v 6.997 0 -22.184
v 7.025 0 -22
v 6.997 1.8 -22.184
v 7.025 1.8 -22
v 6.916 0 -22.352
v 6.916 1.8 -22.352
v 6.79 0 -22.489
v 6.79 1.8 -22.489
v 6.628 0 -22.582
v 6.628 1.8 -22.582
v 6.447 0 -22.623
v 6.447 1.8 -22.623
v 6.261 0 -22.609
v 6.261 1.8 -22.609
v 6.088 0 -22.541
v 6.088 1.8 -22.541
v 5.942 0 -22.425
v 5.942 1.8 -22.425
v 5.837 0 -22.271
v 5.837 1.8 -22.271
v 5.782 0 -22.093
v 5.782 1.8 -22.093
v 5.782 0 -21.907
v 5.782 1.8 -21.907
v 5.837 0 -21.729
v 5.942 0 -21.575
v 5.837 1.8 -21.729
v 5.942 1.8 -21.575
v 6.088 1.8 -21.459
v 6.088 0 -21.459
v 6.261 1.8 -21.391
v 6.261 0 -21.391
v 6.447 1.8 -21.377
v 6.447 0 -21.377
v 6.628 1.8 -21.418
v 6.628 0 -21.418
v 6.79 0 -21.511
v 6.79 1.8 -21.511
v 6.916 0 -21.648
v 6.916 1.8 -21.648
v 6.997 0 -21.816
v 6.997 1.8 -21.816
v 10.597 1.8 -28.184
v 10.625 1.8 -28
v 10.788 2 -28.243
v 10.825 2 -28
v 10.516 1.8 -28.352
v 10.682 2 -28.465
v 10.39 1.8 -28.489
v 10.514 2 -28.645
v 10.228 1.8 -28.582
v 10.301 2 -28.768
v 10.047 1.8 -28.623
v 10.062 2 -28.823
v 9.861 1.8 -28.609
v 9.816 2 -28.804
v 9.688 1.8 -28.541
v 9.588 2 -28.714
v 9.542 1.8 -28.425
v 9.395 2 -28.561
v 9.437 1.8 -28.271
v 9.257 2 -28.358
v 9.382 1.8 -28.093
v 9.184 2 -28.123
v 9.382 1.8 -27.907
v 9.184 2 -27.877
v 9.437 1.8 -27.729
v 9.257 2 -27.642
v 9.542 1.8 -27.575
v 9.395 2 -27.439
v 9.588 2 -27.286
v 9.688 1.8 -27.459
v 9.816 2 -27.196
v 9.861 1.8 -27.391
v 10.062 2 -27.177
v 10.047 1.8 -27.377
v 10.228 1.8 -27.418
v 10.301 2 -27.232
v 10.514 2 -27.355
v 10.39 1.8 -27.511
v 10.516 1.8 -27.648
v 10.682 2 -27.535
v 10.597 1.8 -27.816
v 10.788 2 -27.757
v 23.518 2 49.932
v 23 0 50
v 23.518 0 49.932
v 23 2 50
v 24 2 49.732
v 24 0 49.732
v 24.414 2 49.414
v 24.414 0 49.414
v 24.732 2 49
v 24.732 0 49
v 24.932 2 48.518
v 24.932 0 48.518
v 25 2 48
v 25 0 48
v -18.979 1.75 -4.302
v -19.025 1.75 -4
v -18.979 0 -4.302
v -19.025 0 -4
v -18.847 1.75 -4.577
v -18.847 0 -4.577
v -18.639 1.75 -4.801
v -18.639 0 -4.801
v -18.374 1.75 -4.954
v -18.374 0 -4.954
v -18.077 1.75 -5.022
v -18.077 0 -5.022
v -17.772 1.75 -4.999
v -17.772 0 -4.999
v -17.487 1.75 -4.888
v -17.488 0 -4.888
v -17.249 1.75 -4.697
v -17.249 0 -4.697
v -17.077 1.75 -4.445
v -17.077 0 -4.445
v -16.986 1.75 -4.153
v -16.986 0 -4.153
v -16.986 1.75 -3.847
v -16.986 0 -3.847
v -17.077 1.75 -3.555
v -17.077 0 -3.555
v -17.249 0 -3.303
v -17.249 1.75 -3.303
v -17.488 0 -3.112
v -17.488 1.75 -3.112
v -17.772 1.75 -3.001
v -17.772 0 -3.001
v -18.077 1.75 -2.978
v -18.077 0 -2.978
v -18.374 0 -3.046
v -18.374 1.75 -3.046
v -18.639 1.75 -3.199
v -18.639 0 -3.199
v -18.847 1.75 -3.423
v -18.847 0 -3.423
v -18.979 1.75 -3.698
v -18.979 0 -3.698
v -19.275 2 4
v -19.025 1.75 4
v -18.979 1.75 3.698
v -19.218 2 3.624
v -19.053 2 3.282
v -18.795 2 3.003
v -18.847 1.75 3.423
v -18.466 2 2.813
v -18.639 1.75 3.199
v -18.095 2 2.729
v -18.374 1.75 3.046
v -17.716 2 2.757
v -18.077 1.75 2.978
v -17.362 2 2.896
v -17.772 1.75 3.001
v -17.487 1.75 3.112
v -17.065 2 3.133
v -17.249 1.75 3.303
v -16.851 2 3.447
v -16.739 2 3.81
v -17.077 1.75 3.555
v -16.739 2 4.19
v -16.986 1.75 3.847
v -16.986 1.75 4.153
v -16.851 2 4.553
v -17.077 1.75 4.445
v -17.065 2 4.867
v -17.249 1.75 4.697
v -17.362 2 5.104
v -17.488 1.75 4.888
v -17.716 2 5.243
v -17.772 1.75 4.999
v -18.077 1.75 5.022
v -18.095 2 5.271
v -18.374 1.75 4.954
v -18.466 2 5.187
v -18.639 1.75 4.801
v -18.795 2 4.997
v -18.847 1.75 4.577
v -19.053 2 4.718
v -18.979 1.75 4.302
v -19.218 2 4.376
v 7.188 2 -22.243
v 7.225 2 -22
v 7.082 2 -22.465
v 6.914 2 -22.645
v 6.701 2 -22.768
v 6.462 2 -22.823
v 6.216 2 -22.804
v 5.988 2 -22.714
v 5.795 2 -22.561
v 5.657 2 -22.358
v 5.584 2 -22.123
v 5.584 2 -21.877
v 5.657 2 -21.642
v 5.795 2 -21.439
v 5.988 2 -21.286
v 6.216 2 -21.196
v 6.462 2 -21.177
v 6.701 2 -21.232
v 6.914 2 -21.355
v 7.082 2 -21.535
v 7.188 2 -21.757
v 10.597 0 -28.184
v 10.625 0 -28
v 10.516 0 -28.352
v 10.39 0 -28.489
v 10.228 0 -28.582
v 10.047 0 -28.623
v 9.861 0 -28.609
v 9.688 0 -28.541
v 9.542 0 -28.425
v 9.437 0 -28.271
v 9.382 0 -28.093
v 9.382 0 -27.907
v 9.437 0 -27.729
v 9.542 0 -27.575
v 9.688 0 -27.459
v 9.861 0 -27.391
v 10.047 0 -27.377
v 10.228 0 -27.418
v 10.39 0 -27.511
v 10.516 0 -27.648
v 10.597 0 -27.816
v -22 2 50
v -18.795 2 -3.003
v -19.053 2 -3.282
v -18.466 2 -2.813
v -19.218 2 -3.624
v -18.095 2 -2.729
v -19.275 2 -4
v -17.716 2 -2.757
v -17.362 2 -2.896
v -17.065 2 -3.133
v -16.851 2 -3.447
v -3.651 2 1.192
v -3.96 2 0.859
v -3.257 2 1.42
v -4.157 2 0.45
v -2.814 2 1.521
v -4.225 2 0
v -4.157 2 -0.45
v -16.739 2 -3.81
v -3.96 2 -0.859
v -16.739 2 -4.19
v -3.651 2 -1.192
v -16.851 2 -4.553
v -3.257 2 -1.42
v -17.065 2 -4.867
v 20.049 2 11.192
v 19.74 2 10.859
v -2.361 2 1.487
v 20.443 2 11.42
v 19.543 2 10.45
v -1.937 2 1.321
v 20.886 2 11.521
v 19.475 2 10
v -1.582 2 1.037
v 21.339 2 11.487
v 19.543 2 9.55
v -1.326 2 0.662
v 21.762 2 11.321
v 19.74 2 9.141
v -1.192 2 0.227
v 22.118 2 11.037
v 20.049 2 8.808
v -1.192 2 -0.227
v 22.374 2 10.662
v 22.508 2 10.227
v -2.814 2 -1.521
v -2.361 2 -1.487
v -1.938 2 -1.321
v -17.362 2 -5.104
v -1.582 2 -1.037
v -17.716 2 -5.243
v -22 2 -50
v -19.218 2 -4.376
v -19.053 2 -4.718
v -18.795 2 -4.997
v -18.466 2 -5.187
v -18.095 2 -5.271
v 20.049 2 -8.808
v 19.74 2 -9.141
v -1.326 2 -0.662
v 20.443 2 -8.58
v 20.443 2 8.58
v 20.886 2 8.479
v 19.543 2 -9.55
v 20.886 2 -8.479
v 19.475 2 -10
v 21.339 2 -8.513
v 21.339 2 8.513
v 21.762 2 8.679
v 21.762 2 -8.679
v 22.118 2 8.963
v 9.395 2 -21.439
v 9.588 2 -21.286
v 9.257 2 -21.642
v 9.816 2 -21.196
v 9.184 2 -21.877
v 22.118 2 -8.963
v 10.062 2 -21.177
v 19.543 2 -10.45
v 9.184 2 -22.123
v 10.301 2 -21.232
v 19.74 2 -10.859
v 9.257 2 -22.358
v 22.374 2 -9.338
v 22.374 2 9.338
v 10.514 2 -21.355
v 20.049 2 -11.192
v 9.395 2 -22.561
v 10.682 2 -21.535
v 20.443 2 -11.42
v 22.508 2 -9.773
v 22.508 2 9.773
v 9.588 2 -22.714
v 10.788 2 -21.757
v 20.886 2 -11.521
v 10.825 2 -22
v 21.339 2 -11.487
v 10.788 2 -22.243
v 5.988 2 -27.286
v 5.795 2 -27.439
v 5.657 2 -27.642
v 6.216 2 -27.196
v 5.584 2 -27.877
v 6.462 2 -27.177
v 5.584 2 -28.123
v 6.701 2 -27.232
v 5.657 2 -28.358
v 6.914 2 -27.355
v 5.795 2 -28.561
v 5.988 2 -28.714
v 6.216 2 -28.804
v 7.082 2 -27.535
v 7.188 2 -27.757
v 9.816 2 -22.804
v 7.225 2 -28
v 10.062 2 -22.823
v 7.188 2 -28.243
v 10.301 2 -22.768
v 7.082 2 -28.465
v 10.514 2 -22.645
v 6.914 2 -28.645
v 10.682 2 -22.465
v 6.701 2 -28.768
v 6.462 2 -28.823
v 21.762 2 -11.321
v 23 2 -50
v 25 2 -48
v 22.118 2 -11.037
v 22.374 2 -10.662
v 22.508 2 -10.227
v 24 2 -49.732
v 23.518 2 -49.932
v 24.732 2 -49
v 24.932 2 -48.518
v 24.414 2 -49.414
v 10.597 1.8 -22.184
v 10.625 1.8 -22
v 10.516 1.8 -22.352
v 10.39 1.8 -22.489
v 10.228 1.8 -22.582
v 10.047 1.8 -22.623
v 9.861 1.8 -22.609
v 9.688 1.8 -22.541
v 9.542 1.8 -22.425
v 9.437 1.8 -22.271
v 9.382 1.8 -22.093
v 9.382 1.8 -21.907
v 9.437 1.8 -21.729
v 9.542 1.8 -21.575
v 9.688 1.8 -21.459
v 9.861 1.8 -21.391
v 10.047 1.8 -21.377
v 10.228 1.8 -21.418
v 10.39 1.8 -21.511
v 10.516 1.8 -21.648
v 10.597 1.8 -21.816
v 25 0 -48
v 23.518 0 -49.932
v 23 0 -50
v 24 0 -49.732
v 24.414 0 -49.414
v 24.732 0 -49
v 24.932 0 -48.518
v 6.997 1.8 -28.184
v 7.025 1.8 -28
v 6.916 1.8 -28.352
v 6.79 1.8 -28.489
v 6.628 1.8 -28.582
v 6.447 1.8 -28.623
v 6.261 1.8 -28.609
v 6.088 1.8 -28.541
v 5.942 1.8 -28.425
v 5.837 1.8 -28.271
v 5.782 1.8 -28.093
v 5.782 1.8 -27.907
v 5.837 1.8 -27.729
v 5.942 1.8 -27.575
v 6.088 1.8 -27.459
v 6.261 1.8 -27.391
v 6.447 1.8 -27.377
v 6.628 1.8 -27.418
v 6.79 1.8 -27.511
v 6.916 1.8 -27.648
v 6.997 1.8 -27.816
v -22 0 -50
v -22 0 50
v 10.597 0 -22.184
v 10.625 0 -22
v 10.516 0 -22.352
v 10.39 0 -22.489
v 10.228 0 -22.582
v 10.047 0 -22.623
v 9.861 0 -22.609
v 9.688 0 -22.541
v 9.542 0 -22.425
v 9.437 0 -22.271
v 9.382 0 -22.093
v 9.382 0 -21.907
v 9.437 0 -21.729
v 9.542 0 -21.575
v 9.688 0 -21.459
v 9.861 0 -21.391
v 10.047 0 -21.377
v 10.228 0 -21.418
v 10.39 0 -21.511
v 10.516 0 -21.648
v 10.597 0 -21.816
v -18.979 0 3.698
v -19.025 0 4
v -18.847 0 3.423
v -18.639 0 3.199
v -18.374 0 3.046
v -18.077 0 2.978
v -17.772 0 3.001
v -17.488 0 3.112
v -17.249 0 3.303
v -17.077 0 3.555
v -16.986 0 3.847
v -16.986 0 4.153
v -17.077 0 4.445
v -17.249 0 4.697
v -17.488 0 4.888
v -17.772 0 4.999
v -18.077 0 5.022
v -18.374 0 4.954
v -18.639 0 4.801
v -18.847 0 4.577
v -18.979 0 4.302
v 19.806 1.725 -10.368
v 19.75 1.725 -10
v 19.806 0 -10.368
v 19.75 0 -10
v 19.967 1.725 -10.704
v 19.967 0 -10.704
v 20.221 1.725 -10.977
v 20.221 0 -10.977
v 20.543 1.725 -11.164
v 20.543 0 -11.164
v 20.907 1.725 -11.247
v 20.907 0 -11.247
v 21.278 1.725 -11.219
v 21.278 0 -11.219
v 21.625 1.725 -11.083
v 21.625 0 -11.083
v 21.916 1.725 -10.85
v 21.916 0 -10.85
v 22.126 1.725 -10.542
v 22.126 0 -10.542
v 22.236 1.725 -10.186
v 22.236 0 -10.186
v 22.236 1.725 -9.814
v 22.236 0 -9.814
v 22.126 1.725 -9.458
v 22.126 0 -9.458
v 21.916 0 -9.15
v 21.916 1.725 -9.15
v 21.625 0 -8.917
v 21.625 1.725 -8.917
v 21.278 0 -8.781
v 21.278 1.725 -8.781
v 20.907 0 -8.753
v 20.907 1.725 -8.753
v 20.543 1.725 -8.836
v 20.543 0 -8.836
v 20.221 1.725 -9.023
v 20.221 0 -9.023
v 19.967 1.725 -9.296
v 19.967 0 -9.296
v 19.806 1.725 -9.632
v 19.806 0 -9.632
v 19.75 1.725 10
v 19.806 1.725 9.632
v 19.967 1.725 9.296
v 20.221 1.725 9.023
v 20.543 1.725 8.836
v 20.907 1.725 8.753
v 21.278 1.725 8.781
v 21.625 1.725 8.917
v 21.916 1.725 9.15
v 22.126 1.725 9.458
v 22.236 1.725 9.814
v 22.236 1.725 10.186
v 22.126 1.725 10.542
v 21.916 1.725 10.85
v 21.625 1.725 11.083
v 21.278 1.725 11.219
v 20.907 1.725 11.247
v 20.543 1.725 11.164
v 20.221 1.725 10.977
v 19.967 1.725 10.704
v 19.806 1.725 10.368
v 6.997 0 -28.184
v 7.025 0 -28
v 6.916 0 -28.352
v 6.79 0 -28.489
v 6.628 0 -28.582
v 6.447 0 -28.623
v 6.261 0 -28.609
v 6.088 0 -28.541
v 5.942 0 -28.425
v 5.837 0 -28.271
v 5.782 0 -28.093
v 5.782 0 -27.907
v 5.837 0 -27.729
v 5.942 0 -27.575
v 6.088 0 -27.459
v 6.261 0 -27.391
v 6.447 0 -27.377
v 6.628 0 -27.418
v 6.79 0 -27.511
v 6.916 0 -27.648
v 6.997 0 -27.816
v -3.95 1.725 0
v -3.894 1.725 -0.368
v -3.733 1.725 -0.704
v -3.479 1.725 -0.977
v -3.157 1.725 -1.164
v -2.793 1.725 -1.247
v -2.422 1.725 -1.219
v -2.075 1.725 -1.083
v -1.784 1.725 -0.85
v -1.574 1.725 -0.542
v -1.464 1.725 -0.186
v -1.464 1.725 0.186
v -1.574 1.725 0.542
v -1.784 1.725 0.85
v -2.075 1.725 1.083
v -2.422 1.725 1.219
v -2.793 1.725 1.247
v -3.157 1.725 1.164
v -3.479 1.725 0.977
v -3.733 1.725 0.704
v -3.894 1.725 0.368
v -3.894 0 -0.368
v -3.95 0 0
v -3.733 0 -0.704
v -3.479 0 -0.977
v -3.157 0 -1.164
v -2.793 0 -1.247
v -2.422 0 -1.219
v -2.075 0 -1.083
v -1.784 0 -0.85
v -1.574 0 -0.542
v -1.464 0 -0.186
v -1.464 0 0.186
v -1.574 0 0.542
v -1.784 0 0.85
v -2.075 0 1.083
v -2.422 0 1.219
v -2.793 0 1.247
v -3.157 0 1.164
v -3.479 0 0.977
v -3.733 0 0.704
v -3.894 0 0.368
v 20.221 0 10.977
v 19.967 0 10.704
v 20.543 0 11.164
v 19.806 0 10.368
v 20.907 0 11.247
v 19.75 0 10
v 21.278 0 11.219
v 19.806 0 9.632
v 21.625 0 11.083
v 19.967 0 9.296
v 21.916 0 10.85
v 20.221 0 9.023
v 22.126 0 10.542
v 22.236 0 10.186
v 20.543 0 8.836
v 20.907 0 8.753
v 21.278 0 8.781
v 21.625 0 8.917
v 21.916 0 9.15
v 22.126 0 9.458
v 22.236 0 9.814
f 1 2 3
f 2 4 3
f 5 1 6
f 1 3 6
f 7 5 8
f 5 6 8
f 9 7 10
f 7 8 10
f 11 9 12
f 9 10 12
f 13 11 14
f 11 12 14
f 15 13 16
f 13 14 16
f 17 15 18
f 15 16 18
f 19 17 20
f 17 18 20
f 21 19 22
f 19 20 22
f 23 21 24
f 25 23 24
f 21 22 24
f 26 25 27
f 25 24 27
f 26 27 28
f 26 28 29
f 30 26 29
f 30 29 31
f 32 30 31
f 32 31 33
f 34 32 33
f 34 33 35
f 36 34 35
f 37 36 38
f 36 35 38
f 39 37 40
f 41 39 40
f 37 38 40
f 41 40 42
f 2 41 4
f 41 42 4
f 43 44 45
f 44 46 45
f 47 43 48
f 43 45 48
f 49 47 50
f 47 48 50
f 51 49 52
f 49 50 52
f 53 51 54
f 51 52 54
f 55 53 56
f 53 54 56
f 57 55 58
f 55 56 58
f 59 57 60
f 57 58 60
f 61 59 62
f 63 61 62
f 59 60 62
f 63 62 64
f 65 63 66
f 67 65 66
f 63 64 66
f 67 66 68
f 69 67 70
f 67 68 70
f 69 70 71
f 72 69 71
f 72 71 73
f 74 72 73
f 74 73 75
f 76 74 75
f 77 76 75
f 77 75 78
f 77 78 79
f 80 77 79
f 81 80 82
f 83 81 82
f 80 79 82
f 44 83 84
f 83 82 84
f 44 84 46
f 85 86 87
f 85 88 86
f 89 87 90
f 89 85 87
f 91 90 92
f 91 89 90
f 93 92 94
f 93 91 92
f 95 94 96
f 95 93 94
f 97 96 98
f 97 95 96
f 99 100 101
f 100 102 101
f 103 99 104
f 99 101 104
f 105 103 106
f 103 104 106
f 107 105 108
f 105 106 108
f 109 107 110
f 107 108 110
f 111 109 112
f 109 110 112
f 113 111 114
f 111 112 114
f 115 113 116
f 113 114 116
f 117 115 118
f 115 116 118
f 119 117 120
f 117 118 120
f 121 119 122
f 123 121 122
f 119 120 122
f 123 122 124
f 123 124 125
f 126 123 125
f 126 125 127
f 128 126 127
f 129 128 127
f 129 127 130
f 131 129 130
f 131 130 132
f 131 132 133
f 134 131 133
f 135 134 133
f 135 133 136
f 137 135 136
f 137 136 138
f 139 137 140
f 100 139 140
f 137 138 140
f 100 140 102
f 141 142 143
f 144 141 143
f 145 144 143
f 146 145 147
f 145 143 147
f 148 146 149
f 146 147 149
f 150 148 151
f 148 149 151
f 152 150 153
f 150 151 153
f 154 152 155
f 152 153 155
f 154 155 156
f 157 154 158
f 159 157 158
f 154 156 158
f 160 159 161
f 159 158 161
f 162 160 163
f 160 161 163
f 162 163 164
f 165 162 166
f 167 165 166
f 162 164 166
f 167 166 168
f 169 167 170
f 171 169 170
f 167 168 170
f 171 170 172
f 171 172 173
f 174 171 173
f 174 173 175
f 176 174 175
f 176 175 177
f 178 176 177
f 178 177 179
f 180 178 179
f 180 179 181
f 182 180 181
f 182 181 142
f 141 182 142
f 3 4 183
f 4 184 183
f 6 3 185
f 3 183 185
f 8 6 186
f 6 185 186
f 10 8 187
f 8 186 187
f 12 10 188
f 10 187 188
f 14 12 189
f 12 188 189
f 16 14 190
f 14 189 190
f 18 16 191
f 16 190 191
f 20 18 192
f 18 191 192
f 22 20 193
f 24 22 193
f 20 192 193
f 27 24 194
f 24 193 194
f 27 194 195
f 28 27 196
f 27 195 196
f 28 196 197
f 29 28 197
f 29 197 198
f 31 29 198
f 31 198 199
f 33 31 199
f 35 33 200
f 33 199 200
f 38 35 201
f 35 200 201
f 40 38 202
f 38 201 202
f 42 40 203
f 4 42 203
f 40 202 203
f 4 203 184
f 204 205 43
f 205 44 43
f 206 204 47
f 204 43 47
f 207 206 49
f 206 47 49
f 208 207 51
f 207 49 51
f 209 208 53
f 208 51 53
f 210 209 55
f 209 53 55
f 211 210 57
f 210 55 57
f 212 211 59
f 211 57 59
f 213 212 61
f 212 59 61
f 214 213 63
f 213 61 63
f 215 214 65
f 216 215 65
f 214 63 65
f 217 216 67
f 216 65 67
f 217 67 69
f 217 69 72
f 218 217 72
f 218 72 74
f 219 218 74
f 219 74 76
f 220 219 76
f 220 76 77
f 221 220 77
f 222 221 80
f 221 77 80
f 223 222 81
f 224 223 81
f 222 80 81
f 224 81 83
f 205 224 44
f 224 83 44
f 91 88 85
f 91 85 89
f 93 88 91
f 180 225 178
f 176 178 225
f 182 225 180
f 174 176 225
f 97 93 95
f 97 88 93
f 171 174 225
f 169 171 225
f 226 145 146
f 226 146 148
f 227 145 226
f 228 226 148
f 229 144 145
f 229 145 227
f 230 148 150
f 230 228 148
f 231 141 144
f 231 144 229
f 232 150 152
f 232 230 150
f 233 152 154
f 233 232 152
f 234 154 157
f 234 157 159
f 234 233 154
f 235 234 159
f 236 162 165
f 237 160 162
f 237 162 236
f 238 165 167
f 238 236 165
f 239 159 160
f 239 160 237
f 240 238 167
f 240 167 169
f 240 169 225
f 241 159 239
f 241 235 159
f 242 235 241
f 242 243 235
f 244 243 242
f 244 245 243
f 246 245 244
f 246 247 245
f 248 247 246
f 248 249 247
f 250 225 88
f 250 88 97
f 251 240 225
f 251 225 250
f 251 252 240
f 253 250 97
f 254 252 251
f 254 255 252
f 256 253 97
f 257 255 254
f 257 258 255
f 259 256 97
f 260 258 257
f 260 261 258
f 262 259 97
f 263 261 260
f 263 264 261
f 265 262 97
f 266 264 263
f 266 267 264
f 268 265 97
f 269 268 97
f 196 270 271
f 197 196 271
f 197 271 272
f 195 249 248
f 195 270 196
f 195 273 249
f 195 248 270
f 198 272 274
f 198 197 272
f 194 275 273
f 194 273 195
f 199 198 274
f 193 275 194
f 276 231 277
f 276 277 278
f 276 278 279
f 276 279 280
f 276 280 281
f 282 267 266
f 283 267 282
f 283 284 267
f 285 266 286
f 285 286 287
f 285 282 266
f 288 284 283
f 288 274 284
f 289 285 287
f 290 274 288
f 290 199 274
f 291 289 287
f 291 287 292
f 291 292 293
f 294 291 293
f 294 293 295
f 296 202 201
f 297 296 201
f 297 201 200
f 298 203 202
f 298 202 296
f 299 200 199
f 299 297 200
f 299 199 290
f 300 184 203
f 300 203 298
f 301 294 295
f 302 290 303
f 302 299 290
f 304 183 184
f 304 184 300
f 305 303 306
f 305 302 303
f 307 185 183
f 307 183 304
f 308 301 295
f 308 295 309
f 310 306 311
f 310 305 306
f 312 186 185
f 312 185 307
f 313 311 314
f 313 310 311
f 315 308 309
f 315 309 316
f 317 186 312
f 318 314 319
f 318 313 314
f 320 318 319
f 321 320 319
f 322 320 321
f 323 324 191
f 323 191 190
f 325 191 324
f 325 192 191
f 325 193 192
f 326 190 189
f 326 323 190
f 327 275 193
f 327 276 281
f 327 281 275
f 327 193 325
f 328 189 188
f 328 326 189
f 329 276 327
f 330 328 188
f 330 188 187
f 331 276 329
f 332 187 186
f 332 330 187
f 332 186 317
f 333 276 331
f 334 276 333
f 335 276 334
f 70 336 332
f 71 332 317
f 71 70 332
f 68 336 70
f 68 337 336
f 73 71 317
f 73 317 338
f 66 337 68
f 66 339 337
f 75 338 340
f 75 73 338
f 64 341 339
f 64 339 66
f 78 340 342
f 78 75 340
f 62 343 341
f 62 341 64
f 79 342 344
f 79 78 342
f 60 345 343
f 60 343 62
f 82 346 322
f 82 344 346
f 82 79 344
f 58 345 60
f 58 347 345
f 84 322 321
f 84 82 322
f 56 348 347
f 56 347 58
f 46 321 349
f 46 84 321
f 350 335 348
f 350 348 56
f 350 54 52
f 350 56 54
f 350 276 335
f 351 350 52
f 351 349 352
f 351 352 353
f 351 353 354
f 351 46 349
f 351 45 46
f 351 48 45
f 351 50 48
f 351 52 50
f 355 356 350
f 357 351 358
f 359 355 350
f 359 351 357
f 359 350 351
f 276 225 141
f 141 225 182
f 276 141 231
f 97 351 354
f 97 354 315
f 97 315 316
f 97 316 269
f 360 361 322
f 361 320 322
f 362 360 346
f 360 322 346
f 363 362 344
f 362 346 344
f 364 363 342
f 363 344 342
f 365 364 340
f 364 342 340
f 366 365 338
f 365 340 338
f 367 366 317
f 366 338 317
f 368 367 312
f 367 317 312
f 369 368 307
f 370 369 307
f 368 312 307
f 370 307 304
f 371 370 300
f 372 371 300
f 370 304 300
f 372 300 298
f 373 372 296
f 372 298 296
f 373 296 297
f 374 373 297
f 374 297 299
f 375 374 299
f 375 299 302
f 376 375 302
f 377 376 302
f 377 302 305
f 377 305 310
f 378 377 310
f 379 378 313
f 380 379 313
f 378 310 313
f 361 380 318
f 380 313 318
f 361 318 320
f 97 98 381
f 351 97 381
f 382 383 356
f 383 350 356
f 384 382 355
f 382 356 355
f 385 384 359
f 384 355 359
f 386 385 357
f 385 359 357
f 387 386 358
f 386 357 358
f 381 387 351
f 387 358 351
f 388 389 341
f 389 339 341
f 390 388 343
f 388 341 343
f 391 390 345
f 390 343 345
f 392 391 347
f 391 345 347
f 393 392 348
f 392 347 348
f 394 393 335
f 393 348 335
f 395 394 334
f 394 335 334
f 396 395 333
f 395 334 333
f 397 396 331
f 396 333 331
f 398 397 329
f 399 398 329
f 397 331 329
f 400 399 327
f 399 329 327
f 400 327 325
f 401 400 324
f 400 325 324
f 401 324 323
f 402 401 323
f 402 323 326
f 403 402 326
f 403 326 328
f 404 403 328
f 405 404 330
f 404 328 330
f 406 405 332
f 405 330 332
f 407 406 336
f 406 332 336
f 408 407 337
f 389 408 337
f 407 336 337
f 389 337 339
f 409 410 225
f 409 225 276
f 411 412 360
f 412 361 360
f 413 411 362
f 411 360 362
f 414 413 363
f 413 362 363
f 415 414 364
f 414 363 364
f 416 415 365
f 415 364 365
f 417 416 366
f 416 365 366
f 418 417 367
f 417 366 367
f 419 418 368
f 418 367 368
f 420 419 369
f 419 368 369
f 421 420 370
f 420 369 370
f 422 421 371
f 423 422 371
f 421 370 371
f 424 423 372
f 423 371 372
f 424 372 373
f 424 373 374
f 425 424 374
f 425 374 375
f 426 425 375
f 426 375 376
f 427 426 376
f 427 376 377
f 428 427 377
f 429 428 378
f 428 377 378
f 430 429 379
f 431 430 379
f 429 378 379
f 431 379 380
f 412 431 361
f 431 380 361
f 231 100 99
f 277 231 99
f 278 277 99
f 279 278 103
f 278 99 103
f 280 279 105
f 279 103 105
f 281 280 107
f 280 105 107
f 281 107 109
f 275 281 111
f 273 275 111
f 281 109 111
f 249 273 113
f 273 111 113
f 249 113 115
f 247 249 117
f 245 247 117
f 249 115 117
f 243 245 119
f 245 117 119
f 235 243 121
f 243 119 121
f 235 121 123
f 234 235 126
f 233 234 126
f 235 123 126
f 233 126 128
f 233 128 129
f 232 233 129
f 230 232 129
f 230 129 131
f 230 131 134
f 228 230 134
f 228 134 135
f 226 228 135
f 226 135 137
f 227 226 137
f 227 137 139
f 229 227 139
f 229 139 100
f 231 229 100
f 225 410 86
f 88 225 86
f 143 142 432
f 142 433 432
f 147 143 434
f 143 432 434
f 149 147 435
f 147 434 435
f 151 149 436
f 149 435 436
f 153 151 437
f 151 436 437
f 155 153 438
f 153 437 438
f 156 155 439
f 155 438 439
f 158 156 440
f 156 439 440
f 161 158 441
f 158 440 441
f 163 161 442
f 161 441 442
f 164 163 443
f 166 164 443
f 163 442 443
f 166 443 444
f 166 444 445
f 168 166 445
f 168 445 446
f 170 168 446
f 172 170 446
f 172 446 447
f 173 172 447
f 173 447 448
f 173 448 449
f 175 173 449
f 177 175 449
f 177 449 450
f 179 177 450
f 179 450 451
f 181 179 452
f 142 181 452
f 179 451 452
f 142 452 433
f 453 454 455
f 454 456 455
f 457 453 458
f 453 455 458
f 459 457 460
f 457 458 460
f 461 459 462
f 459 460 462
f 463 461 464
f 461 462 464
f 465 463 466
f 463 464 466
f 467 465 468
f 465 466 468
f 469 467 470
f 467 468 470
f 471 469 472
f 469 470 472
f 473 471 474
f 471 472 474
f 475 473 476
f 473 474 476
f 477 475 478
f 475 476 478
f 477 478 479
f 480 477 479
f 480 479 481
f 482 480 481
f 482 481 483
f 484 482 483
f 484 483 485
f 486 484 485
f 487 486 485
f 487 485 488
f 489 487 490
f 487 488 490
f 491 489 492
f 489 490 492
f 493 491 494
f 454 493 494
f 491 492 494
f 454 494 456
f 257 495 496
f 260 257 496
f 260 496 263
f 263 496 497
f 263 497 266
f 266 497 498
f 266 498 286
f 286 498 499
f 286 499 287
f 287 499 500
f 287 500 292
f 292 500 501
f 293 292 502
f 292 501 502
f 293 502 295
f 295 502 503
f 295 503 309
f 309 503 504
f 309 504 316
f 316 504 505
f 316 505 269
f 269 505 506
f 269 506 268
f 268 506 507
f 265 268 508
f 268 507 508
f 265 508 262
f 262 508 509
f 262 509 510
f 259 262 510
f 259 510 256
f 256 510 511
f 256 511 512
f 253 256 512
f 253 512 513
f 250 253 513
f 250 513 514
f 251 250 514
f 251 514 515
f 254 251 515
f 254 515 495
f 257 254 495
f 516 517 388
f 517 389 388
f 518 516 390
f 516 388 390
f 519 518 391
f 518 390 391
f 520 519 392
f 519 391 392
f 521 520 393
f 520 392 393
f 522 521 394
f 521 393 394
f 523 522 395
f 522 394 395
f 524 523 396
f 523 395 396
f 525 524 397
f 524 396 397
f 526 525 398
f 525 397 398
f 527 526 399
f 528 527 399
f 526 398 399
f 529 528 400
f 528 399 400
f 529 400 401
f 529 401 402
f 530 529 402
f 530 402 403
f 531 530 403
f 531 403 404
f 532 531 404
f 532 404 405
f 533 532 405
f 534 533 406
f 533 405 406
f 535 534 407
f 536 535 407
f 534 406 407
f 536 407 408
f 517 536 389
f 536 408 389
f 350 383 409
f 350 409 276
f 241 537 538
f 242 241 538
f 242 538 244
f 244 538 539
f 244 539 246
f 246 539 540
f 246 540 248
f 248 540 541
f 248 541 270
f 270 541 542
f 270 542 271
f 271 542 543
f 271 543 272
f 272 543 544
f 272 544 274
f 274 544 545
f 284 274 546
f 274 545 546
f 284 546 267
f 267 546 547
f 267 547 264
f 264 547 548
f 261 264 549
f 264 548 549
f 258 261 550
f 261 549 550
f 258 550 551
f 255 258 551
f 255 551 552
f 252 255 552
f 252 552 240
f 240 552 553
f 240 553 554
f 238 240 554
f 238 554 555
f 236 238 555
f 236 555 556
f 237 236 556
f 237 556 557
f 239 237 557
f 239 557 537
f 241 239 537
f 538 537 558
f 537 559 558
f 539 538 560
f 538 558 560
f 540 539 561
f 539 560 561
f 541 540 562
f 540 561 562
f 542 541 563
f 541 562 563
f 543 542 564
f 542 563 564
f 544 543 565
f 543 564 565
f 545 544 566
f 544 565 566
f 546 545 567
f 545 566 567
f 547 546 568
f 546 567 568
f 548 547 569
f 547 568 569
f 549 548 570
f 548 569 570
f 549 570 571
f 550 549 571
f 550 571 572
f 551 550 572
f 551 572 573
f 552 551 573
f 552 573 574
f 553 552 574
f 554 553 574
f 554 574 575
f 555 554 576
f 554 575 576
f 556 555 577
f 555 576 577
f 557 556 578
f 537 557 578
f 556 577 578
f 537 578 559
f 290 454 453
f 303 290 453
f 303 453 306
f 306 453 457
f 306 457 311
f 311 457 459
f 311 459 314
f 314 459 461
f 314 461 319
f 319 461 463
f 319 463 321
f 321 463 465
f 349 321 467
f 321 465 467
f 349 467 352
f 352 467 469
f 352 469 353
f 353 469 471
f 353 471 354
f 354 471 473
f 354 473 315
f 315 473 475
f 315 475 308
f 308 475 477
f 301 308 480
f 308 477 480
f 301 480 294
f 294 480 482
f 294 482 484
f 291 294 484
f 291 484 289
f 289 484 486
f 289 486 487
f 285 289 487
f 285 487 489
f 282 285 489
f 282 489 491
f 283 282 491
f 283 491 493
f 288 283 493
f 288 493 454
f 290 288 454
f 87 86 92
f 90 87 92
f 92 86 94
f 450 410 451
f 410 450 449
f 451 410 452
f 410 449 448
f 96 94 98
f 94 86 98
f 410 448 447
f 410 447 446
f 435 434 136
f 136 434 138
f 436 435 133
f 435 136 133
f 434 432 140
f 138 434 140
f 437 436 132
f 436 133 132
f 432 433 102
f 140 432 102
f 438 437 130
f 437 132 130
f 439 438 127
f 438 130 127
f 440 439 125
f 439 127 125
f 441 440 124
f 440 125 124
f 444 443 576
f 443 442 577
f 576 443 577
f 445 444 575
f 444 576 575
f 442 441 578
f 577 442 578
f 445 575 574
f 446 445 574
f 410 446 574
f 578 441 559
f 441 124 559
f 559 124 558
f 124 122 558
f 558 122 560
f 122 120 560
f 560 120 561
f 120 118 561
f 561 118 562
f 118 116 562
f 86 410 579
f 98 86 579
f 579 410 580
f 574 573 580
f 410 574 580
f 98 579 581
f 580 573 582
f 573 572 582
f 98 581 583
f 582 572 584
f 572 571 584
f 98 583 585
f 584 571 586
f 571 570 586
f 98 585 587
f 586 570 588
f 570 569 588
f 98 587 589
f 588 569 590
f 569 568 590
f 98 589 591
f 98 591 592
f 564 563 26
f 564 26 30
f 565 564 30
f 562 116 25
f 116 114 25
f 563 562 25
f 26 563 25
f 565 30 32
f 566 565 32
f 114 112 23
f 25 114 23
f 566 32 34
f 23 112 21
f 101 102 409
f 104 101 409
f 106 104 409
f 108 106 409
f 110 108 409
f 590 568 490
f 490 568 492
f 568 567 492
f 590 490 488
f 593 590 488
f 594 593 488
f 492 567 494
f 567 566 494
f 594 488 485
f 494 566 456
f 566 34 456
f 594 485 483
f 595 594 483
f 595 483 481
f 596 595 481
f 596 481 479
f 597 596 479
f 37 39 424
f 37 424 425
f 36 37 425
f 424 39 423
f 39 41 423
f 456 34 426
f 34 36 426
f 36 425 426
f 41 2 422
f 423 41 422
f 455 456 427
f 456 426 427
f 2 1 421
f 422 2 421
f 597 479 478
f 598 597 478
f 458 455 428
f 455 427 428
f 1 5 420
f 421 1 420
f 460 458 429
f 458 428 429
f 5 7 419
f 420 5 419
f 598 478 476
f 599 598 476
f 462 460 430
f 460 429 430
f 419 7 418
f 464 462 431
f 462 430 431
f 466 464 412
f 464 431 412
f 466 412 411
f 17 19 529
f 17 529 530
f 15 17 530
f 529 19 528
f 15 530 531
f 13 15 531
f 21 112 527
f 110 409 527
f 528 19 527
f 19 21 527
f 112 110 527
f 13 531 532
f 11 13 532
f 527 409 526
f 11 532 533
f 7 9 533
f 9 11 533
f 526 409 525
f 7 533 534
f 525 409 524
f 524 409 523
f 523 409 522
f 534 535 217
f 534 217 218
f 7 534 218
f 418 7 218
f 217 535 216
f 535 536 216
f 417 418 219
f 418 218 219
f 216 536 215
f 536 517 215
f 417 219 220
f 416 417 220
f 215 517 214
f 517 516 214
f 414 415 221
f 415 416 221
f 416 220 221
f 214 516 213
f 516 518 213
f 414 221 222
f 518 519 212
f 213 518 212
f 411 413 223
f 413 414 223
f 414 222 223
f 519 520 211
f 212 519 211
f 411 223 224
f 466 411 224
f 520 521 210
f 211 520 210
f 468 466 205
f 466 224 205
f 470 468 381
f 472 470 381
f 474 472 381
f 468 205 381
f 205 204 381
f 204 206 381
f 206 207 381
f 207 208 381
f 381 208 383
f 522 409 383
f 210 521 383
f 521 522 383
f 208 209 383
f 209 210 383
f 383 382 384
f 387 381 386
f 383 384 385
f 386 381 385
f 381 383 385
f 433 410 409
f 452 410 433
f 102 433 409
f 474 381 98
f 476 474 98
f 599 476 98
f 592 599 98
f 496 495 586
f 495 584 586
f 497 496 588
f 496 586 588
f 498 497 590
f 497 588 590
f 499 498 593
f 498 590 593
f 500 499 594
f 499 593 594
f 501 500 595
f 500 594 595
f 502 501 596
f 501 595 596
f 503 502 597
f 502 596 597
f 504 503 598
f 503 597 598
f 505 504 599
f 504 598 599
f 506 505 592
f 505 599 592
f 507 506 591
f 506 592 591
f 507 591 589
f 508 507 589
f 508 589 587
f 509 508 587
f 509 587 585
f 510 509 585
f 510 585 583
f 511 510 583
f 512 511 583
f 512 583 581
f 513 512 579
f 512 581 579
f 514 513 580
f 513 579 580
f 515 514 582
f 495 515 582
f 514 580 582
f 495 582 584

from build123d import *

# Parameters (mm, degrees)
SKETCH_1_W                     = 50
SKETCH_1_H                     = 100
EXTRUDE_1_DEPTH                = 2
SKETCH_2_W                     = 3
SKETCH_2_H                     = 100
EXTRUDE_2_DEPTH                = 80
SKETCH_3_W                     = 2
SKETCH_3_H                     = 66.7
EXTRUDE_3_DEPTH                = 70
CUT_EXTRUDE_4_REACH            = 162.465
SKETCH_8_W                     = 2
SKETCH_8_H                     = 66.7
EXTRUDE_4_DEPTH                = 70
CUT_EXTRUDE_5_REACH            = 140.25
HOLE_WIZARD_M3_1_D             = 2.5
HOLE_WIZARD_M3_1_DEPTH         = 2
HOLE_WIZARD_M3_1_CSINK_D       = 3.05
HOLE_WIZARD_M3_1_CSINK_ANGLE   = 90
FILLET_1_R                     = 2
CUT_EXTRUDE_6_REACH            = 140.25
SKETCH_12_R                    = 11
CUT_EXTRUDE_7_REACH            = 162.465
SKETCH_13_R                    = 14.5
SKETCH_14_W                    = 2
SKETCH_14_H                    = 66.7
EXTRUDE_5_DEPTH                = 70
CUT_EXTRUDE_8_REACH            = 156.14
SKETCH_15_R                    = 5.1
CUT_EXTRUDE_9_DEPTH            = 155.140358116
CUT_EXTRUDE_9_DEPTH_BACK       = 155.140358116
SKETCH_19_W                    = 2
SKETCH_19_H                    = 66.7
CUT_EXTRUDE_10_DEPTH           = 119.844436134
FILLET_2_R                     = 2
HOLE_WIZARD_M3_3_D             = 2.5
HOLE_WIZARD_M3_3_CSINK_D       = 3.05
HOLE_WIZARD_M3_3_CSINK_ANGLE   = 90
CUT_EXTRUDE_11_DEPTH           = 134.88427839
CUT_EXTRUDE_11_DEPTH_BACK      = 134.88427839
SKETCH_28_W                    = 73
SKETCH_28_H                    = 100
HOLE_WIZARD_M2_5_1_D           = 2.05
HOLE_WIZARD_M2_5_1_CSINK_D     = 2.55
HOLE_WIZARD_M2_5_1_CSINK_ANGLE = 90


# Read off the part's stored shape, not the designer's step: M1.6 螺纹孔1, M1.6 螺纹孔2
with BuildPart() as part:
    # 草图1 → 凸台-拉伸1 (new body)
    with BuildSketch(Plane(origin=(0, 0, 0), x_dir=(1, 0, 0), z_dir=(0, 1, 0))):
        Rectangle(SKETCH_1_W, SKETCH_1_H)
    extrude(amount=EXTRUDE_1_DEPTH)

    # 草图2 → 凸台-拉伸2 (add)
    with BuildSketch(Plane(origin=(0, 2, 0), x_dir=(1, 0, 0), z_dir=(0, 1, 0))):
        with Locations((-23.5, 0)):
            Rectangle(SKETCH_2_W, SKETCH_2_H)
    extrude(amount=EXTRUDE_2_DEPTH)

    # 草图3 → 凸台-拉伸3 (add)
    with BuildSketch(Plane.ZY.offset(25)):
        with Locations((-49, 48.65)):
            Rectangle(SKETCH_3_W, SKETCH_3_H)
    extrude(amount=EXTRUDE_3_DEPTH)

    # 草图4 → 切除-拉伸4 (cut, up to next)
    with BuildSketch(Plane(origin=(0, 0, -50), x_dir=(-1, 0, 0), z_dir=(0, 0, -1)), mode=Mode.PRIVATE) as cut_extrude_4_sk1:
        with BuildLine():
            Line((95, 82), (61.65, 82))
            ThreePointArc((61.65, 82), (85.232011153, 72.232011153), (95, 48.65))
            Line((95, 48.65), (95, 82))
        make_face()
    cut_extrude_4_tool1 = extrude(cut_extrude_4_sk1.sketch, amount=-CUT_EXTRUDE_4_REACH, mode=Mode.PRIVATE) & part.part
    # 草图4 → 切除-拉伸4 (cut, up to next)
    with BuildSketch(Plane(origin=(0, 0, -50), x_dir=(-1, 0, 0), z_dir=(0, 0, -1)), mode=Mode.PRIVATE) as cut_extrude_4_sk2:
        with BuildLine():
            ThreePointArc((95, 48.65), (85.232011153, 25.067988847), (61.65, 15.3))
            Line((61.65, 15.3), (95, 15.3))
            Line((95, 15.3), (95, 48.65))
        make_face()
    cut_extrude_4_tool2 = extrude(cut_extrude_4_sk2.sketch, amount=-CUT_EXTRUDE_4_REACH, mode=Mode.PRIVATE) & part.part
    add(cut_extrude_4_tool1.solids().sort_by_distance((-87.550679, 74.550679, -50))[0], mode=Mode.SUBTRACT)
    add(cut_extrude_4_tool2.solids().sort_by_distance((-87.550679, 22.749321, -50))[0], mode=Mode.SUBTRACT)

    # 草图8 → 凸台-拉伸4 (add)
    with BuildSketch(Plane.ZY.offset(25)):
        with Locations((7, 48.65)):
            Rectangle(SKETCH_8_W, SKETCH_8_H)
    extrude(amount=EXTRUDE_4_DEPTH)

    # 草图9 → 切除-拉伸5 (cut, up to next)
    with BuildSketch(Plane.XY.offset(8), mode=Mode.PRIVATE) as cut_extrude_5_sk1:
        with BuildLine():
            ThreePointArc((-95, 48.65), (-85.232011153, 72.232011153), (-61.65, 82))
            Line((-61.65, 82), (-95, 82))
            Line((-95, 82), (-95, 48.65))
        make_face()
    cut_extrude_5_tool1 = extrude(cut_extrude_5_sk1.sketch, amount=-CUT_EXTRUDE_5_REACH, mode=Mode.PRIVATE) & part.part
    # 草图9 → 切除-拉伸5 (cut, up to next)
    with BuildSketch(Plane.XY.offset(8), mode=Mode.PRIVATE) as cut_extrude_5_sk2:
        with BuildLine():
            ThreePointArc((-61.65, 15.3), (-85.232011153, 25.067988847), (-95, 48.65))
            Line((-95, 48.65), (-95, 15.3))
            Line((-95, 15.3), (-61.65, 15.3))
        make_face()
    cut_extrude_5_tool2 = extrude(cut_extrude_5_sk2.sketch, amount=-CUT_EXTRUDE_5_REACH, mode=Mode.PRIVATE) & part.part
    add(cut_extrude_5_tool1.solids().sort_by_distance((-87.550679, 74.550679, 8))[0], mode=Mode.SUBTRACT)
    add(cut_extrude_5_tool2.solids().sort_by_distance((-87.550679, 22.749321, 8))[0], mode=Mode.SUBTRACT)

    # M3 螺纹孔1
    with Locations(Plane.XY.offset(8)):
        with Locations((-78.970508076, 38.65), (-61.65, 68.65), (-44.329491924, 38.65)):
            CounterSinkHole(HOLE_WIZARD_M3_1_D / 2, HOLE_WIZARD_M3_1_CSINK_D / 2, depth=HOLE_WIZARD_M3_1_DEPTH, counter_sink_angle=HOLE_WIZARD_M3_1_CSINK_ANGLE)

    # 圆角1
    fillet_1_edges = [part.edges().sort_by_distance(p)[0] for p in [
        (-23.5, 82, 50),
        (25, 1, 50),
        (25, 1, -50),
    ]]
    fillet(fillet_1_edges, radius=FILLET_1_R)

    # 草图12 → 切除-拉伸6 (cut, up to next)
    with BuildSketch(Plane.XY.offset(8), mode=Mode.PRIVATE) as cut_extrude_6_sk1:
        with Locations((-61.65, 48.65)):
            Circle(SKETCH_12_R)
    cut_extrude_6_tool1 = extrude(cut_extrude_6_sk1.sketch, amount=-CUT_EXTRUDE_6_REACH, mode=Mode.PRIVATE) & part.part
    add(cut_extrude_6_tool1.solids().sort_by_distance((-61.65, 48.65, 8))[0], mode=Mode.SUBTRACT)

    # 草图13 → 切除-拉伸7 (cut, up to next)
    with BuildSketch(Plane(origin=(0, 0, -50), x_dir=(-1, 0, 0), z_dir=(0, 0, -1)), mode=Mode.PRIVATE) as cut_extrude_7_sk1:
        with Locations((61.65, 48.65)):
            Circle(SKETCH_13_R)
    cut_extrude_7_tool1 = extrude(cut_extrude_7_sk1.sketch, amount=-CUT_EXTRUDE_7_REACH, mode=Mode.PRIVATE) & part.part
    add(cut_extrude_7_tool1.solids().sort_by_distance((-61.65, 48.65, -50))[0], mode=Mode.SUBTRACT)

    # 草图14 → 凸台-拉伸5 (add)
    with BuildSketch(Plane.ZY.offset(25)):
        with Locations((-38.5, 48.65)):
            Rectangle(SKETCH_14_W, SKETCH_14_H)
    extrude(amount=EXTRUDE_5_DEPTH)

    # 草图15 → 切除-拉伸8 (cut, up to next)
    with BuildSketch(Plane(origin=(0, 0, -39.5), x_dir=(-1, 0, 0), z_dir=(0, 0, -1)), mode=Mode.PRIVATE) as cut_extrude_8_sk1:
        with Locations(Location((61.65, 48.65, 0), (0, 0, 90))):
            Circle(SKETCH_15_R)
    cut_extrude_8_tool1 = extrude(cut_extrude_8_sk1.sketch, amount=-CUT_EXTRUDE_8_REACH, mode=Mode.PRIVATE) & part.part
    add(cut_extrude_8_tool1.solids().sort_by_distance((-61.65, 48.65, -39.5))[0], mode=Mode.SUBTRACT)

    # 草图18 → 切除-拉伸9 (cut, two sides: drawn at the far end of the back side and taken through both)
    with BuildSketch(Plane(origin=(0, 0, -39.5), x_dir=(-1, 0, 0), z_dir=(0, 0, -1)).offset(-CUT_EXTRUDE_9_DEPTH_BACK)):
        with BuildLine():
            Line((95, 15.3), (95, 48.65))
            ThreePointArc((95, 48.65), (85.232011153, 25.067988847), (61.65, 15.3))
            Line((61.65, 15.3), (95, 15.3))
        make_face()
        with BuildLine():
            Line((95, 48.65), (95, 82))
            Line((95, 82), (61.65, 82))
            ThreePointArc((61.65, 82), (85.232011153, 72.232011153), (95, 48.65))
        make_face()
    extrude(amount=CUT_EXTRUDE_9_DEPTH + CUT_EXTRUDE_9_DEPTH_BACK, mode=Mode.SUBTRACT)

    # 草图19 → 切除-拉伸10 (cut, through all)
    with BuildSketch(Plane.ZY.offset(25)):
        with Locations((-49, 48.65)):
            Rectangle(SKETCH_19_W, SKETCH_19_H)
    extrude(amount=CUT_EXTRUDE_10_DEPTH, mode=Mode.SUBTRACT)

    # 圆角2
    fillet_2_edges = [part.edges().sort_by_distance(p)[0] for p in [
        (-23.5, 82, -50),
    ]]
    fillet(fillet_2_edges, radius=FILLET_2_R)

    # M3 螺纹孔3 (through all)
    with Locations(Plane(origin=(0, 2, 0), x_dir=(1, 0, 0), z_dir=(0, 1, 0))):
        with Locations((-2.7, 0), (21, 10), (21, -10)):
            CounterSinkHole(HOLE_WIZARD_M3_3_D / 2, HOLE_WIZARD_M3_3_CSINK_D / 2, counter_sink_angle=HOLE_WIZARD_M3_3_CSINK_ANGLE)

    # M1.6 螺纹孔1 outline → M1.6 螺纹孔1 (revolve, cut)
    with BuildSketch(Plane(origin=(10, 0, -28), x_dir=(1, 0, 0), z_dir=(0, 0, 1))):
        Polygon((0, 0), (0.625, 0), (0.625, 1.8), (0.825, 2), (0, 2), align=None)
    revolve(axis=Axis((10, 0, -28), (0, 1, 0)), mode=Mode.SUBTRACT)

    # Hole Wizard M1.6 _1 2 outline → Hole Wizard M1.6 _1 2 (revolve, cut)
    with BuildSketch(Plane(origin=(6.4, 0, -28), x_dir=(1, 0, 0), z_dir=(0, 0, 1))):
        Polygon((0, 0), (0.625, 0), (0.625, 1.8), (0.825, 2), (0, 2), align=None)
    revolve(axis=Axis((6.4, 0, -28), (0, 1, 0)), mode=Mode.SUBTRACT)

    # M1.6 螺纹孔2 outline → M1.6 螺纹孔2 (revolve, cut)
    with BuildSketch(Plane(origin=(10, 0, -22), x_dir=(1, 0, 0), z_dir=(0, 0, 1))):
        Polygon((0, 0), (0.625, 0), (0.625, 1.8), (0.825, 2), (0, 2), align=None)
    revolve(axis=Axis((10, 0, -22), (0, 1, 0)), mode=Mode.SUBTRACT)

    # Hole Wizard M1.6 _2 2 outline → Hole Wizard M1.6 _2 2 (revolve, cut)
    with BuildSketch(Plane(origin=(6.4, 0, -22), x_dir=(1, 0, 0), z_dir=(0, 0, 1))):
        Polygon((0, 0), (0.625, 0), (0.625, 1.8), (0.825, 2), (0, 2), align=None)
    revolve(axis=Axis((6.4, 0, -22), (0, 1, 0)), mode=Mode.SUBTRACT)

    # 草图28 → 切除-拉伸11 (cut, two sides: drawn at the far end of the back side and taken through both)
    with BuildSketch(Plane(origin=(0, 2, 0), x_dir=(1, 0, 0), z_dir=(0, 1, 0)).offset(-CUT_EXTRUDE_11_DEPTH_BACK)):
        with Locations((-58.5, 0)):
            Rectangle(SKETCH_28_W, SKETCH_28_H)
    extrude(amount=CUT_EXTRUDE_11_DEPTH + CUT_EXTRUDE_11_DEPTH_BACK, mode=Mode.SUBTRACT)

    # M2.5 螺纹孔1 (through all)
    with Locations(Plane(origin=(0, 2, 0), x_dir=(1, 0, 0), z_dir=(0, 1, 0))):
        with Locations((-18, 4), (-18, -4)):
            CounterSinkHole(HOLE_WIZARD_M2_5_1_D / 2, HOLE_WIZARD_M2_5_1_CSINK_D / 2, counter_sink_angle=HOLE_WIZARD_M2_5_1_CSINK_ANGLE)


solid = part.part
